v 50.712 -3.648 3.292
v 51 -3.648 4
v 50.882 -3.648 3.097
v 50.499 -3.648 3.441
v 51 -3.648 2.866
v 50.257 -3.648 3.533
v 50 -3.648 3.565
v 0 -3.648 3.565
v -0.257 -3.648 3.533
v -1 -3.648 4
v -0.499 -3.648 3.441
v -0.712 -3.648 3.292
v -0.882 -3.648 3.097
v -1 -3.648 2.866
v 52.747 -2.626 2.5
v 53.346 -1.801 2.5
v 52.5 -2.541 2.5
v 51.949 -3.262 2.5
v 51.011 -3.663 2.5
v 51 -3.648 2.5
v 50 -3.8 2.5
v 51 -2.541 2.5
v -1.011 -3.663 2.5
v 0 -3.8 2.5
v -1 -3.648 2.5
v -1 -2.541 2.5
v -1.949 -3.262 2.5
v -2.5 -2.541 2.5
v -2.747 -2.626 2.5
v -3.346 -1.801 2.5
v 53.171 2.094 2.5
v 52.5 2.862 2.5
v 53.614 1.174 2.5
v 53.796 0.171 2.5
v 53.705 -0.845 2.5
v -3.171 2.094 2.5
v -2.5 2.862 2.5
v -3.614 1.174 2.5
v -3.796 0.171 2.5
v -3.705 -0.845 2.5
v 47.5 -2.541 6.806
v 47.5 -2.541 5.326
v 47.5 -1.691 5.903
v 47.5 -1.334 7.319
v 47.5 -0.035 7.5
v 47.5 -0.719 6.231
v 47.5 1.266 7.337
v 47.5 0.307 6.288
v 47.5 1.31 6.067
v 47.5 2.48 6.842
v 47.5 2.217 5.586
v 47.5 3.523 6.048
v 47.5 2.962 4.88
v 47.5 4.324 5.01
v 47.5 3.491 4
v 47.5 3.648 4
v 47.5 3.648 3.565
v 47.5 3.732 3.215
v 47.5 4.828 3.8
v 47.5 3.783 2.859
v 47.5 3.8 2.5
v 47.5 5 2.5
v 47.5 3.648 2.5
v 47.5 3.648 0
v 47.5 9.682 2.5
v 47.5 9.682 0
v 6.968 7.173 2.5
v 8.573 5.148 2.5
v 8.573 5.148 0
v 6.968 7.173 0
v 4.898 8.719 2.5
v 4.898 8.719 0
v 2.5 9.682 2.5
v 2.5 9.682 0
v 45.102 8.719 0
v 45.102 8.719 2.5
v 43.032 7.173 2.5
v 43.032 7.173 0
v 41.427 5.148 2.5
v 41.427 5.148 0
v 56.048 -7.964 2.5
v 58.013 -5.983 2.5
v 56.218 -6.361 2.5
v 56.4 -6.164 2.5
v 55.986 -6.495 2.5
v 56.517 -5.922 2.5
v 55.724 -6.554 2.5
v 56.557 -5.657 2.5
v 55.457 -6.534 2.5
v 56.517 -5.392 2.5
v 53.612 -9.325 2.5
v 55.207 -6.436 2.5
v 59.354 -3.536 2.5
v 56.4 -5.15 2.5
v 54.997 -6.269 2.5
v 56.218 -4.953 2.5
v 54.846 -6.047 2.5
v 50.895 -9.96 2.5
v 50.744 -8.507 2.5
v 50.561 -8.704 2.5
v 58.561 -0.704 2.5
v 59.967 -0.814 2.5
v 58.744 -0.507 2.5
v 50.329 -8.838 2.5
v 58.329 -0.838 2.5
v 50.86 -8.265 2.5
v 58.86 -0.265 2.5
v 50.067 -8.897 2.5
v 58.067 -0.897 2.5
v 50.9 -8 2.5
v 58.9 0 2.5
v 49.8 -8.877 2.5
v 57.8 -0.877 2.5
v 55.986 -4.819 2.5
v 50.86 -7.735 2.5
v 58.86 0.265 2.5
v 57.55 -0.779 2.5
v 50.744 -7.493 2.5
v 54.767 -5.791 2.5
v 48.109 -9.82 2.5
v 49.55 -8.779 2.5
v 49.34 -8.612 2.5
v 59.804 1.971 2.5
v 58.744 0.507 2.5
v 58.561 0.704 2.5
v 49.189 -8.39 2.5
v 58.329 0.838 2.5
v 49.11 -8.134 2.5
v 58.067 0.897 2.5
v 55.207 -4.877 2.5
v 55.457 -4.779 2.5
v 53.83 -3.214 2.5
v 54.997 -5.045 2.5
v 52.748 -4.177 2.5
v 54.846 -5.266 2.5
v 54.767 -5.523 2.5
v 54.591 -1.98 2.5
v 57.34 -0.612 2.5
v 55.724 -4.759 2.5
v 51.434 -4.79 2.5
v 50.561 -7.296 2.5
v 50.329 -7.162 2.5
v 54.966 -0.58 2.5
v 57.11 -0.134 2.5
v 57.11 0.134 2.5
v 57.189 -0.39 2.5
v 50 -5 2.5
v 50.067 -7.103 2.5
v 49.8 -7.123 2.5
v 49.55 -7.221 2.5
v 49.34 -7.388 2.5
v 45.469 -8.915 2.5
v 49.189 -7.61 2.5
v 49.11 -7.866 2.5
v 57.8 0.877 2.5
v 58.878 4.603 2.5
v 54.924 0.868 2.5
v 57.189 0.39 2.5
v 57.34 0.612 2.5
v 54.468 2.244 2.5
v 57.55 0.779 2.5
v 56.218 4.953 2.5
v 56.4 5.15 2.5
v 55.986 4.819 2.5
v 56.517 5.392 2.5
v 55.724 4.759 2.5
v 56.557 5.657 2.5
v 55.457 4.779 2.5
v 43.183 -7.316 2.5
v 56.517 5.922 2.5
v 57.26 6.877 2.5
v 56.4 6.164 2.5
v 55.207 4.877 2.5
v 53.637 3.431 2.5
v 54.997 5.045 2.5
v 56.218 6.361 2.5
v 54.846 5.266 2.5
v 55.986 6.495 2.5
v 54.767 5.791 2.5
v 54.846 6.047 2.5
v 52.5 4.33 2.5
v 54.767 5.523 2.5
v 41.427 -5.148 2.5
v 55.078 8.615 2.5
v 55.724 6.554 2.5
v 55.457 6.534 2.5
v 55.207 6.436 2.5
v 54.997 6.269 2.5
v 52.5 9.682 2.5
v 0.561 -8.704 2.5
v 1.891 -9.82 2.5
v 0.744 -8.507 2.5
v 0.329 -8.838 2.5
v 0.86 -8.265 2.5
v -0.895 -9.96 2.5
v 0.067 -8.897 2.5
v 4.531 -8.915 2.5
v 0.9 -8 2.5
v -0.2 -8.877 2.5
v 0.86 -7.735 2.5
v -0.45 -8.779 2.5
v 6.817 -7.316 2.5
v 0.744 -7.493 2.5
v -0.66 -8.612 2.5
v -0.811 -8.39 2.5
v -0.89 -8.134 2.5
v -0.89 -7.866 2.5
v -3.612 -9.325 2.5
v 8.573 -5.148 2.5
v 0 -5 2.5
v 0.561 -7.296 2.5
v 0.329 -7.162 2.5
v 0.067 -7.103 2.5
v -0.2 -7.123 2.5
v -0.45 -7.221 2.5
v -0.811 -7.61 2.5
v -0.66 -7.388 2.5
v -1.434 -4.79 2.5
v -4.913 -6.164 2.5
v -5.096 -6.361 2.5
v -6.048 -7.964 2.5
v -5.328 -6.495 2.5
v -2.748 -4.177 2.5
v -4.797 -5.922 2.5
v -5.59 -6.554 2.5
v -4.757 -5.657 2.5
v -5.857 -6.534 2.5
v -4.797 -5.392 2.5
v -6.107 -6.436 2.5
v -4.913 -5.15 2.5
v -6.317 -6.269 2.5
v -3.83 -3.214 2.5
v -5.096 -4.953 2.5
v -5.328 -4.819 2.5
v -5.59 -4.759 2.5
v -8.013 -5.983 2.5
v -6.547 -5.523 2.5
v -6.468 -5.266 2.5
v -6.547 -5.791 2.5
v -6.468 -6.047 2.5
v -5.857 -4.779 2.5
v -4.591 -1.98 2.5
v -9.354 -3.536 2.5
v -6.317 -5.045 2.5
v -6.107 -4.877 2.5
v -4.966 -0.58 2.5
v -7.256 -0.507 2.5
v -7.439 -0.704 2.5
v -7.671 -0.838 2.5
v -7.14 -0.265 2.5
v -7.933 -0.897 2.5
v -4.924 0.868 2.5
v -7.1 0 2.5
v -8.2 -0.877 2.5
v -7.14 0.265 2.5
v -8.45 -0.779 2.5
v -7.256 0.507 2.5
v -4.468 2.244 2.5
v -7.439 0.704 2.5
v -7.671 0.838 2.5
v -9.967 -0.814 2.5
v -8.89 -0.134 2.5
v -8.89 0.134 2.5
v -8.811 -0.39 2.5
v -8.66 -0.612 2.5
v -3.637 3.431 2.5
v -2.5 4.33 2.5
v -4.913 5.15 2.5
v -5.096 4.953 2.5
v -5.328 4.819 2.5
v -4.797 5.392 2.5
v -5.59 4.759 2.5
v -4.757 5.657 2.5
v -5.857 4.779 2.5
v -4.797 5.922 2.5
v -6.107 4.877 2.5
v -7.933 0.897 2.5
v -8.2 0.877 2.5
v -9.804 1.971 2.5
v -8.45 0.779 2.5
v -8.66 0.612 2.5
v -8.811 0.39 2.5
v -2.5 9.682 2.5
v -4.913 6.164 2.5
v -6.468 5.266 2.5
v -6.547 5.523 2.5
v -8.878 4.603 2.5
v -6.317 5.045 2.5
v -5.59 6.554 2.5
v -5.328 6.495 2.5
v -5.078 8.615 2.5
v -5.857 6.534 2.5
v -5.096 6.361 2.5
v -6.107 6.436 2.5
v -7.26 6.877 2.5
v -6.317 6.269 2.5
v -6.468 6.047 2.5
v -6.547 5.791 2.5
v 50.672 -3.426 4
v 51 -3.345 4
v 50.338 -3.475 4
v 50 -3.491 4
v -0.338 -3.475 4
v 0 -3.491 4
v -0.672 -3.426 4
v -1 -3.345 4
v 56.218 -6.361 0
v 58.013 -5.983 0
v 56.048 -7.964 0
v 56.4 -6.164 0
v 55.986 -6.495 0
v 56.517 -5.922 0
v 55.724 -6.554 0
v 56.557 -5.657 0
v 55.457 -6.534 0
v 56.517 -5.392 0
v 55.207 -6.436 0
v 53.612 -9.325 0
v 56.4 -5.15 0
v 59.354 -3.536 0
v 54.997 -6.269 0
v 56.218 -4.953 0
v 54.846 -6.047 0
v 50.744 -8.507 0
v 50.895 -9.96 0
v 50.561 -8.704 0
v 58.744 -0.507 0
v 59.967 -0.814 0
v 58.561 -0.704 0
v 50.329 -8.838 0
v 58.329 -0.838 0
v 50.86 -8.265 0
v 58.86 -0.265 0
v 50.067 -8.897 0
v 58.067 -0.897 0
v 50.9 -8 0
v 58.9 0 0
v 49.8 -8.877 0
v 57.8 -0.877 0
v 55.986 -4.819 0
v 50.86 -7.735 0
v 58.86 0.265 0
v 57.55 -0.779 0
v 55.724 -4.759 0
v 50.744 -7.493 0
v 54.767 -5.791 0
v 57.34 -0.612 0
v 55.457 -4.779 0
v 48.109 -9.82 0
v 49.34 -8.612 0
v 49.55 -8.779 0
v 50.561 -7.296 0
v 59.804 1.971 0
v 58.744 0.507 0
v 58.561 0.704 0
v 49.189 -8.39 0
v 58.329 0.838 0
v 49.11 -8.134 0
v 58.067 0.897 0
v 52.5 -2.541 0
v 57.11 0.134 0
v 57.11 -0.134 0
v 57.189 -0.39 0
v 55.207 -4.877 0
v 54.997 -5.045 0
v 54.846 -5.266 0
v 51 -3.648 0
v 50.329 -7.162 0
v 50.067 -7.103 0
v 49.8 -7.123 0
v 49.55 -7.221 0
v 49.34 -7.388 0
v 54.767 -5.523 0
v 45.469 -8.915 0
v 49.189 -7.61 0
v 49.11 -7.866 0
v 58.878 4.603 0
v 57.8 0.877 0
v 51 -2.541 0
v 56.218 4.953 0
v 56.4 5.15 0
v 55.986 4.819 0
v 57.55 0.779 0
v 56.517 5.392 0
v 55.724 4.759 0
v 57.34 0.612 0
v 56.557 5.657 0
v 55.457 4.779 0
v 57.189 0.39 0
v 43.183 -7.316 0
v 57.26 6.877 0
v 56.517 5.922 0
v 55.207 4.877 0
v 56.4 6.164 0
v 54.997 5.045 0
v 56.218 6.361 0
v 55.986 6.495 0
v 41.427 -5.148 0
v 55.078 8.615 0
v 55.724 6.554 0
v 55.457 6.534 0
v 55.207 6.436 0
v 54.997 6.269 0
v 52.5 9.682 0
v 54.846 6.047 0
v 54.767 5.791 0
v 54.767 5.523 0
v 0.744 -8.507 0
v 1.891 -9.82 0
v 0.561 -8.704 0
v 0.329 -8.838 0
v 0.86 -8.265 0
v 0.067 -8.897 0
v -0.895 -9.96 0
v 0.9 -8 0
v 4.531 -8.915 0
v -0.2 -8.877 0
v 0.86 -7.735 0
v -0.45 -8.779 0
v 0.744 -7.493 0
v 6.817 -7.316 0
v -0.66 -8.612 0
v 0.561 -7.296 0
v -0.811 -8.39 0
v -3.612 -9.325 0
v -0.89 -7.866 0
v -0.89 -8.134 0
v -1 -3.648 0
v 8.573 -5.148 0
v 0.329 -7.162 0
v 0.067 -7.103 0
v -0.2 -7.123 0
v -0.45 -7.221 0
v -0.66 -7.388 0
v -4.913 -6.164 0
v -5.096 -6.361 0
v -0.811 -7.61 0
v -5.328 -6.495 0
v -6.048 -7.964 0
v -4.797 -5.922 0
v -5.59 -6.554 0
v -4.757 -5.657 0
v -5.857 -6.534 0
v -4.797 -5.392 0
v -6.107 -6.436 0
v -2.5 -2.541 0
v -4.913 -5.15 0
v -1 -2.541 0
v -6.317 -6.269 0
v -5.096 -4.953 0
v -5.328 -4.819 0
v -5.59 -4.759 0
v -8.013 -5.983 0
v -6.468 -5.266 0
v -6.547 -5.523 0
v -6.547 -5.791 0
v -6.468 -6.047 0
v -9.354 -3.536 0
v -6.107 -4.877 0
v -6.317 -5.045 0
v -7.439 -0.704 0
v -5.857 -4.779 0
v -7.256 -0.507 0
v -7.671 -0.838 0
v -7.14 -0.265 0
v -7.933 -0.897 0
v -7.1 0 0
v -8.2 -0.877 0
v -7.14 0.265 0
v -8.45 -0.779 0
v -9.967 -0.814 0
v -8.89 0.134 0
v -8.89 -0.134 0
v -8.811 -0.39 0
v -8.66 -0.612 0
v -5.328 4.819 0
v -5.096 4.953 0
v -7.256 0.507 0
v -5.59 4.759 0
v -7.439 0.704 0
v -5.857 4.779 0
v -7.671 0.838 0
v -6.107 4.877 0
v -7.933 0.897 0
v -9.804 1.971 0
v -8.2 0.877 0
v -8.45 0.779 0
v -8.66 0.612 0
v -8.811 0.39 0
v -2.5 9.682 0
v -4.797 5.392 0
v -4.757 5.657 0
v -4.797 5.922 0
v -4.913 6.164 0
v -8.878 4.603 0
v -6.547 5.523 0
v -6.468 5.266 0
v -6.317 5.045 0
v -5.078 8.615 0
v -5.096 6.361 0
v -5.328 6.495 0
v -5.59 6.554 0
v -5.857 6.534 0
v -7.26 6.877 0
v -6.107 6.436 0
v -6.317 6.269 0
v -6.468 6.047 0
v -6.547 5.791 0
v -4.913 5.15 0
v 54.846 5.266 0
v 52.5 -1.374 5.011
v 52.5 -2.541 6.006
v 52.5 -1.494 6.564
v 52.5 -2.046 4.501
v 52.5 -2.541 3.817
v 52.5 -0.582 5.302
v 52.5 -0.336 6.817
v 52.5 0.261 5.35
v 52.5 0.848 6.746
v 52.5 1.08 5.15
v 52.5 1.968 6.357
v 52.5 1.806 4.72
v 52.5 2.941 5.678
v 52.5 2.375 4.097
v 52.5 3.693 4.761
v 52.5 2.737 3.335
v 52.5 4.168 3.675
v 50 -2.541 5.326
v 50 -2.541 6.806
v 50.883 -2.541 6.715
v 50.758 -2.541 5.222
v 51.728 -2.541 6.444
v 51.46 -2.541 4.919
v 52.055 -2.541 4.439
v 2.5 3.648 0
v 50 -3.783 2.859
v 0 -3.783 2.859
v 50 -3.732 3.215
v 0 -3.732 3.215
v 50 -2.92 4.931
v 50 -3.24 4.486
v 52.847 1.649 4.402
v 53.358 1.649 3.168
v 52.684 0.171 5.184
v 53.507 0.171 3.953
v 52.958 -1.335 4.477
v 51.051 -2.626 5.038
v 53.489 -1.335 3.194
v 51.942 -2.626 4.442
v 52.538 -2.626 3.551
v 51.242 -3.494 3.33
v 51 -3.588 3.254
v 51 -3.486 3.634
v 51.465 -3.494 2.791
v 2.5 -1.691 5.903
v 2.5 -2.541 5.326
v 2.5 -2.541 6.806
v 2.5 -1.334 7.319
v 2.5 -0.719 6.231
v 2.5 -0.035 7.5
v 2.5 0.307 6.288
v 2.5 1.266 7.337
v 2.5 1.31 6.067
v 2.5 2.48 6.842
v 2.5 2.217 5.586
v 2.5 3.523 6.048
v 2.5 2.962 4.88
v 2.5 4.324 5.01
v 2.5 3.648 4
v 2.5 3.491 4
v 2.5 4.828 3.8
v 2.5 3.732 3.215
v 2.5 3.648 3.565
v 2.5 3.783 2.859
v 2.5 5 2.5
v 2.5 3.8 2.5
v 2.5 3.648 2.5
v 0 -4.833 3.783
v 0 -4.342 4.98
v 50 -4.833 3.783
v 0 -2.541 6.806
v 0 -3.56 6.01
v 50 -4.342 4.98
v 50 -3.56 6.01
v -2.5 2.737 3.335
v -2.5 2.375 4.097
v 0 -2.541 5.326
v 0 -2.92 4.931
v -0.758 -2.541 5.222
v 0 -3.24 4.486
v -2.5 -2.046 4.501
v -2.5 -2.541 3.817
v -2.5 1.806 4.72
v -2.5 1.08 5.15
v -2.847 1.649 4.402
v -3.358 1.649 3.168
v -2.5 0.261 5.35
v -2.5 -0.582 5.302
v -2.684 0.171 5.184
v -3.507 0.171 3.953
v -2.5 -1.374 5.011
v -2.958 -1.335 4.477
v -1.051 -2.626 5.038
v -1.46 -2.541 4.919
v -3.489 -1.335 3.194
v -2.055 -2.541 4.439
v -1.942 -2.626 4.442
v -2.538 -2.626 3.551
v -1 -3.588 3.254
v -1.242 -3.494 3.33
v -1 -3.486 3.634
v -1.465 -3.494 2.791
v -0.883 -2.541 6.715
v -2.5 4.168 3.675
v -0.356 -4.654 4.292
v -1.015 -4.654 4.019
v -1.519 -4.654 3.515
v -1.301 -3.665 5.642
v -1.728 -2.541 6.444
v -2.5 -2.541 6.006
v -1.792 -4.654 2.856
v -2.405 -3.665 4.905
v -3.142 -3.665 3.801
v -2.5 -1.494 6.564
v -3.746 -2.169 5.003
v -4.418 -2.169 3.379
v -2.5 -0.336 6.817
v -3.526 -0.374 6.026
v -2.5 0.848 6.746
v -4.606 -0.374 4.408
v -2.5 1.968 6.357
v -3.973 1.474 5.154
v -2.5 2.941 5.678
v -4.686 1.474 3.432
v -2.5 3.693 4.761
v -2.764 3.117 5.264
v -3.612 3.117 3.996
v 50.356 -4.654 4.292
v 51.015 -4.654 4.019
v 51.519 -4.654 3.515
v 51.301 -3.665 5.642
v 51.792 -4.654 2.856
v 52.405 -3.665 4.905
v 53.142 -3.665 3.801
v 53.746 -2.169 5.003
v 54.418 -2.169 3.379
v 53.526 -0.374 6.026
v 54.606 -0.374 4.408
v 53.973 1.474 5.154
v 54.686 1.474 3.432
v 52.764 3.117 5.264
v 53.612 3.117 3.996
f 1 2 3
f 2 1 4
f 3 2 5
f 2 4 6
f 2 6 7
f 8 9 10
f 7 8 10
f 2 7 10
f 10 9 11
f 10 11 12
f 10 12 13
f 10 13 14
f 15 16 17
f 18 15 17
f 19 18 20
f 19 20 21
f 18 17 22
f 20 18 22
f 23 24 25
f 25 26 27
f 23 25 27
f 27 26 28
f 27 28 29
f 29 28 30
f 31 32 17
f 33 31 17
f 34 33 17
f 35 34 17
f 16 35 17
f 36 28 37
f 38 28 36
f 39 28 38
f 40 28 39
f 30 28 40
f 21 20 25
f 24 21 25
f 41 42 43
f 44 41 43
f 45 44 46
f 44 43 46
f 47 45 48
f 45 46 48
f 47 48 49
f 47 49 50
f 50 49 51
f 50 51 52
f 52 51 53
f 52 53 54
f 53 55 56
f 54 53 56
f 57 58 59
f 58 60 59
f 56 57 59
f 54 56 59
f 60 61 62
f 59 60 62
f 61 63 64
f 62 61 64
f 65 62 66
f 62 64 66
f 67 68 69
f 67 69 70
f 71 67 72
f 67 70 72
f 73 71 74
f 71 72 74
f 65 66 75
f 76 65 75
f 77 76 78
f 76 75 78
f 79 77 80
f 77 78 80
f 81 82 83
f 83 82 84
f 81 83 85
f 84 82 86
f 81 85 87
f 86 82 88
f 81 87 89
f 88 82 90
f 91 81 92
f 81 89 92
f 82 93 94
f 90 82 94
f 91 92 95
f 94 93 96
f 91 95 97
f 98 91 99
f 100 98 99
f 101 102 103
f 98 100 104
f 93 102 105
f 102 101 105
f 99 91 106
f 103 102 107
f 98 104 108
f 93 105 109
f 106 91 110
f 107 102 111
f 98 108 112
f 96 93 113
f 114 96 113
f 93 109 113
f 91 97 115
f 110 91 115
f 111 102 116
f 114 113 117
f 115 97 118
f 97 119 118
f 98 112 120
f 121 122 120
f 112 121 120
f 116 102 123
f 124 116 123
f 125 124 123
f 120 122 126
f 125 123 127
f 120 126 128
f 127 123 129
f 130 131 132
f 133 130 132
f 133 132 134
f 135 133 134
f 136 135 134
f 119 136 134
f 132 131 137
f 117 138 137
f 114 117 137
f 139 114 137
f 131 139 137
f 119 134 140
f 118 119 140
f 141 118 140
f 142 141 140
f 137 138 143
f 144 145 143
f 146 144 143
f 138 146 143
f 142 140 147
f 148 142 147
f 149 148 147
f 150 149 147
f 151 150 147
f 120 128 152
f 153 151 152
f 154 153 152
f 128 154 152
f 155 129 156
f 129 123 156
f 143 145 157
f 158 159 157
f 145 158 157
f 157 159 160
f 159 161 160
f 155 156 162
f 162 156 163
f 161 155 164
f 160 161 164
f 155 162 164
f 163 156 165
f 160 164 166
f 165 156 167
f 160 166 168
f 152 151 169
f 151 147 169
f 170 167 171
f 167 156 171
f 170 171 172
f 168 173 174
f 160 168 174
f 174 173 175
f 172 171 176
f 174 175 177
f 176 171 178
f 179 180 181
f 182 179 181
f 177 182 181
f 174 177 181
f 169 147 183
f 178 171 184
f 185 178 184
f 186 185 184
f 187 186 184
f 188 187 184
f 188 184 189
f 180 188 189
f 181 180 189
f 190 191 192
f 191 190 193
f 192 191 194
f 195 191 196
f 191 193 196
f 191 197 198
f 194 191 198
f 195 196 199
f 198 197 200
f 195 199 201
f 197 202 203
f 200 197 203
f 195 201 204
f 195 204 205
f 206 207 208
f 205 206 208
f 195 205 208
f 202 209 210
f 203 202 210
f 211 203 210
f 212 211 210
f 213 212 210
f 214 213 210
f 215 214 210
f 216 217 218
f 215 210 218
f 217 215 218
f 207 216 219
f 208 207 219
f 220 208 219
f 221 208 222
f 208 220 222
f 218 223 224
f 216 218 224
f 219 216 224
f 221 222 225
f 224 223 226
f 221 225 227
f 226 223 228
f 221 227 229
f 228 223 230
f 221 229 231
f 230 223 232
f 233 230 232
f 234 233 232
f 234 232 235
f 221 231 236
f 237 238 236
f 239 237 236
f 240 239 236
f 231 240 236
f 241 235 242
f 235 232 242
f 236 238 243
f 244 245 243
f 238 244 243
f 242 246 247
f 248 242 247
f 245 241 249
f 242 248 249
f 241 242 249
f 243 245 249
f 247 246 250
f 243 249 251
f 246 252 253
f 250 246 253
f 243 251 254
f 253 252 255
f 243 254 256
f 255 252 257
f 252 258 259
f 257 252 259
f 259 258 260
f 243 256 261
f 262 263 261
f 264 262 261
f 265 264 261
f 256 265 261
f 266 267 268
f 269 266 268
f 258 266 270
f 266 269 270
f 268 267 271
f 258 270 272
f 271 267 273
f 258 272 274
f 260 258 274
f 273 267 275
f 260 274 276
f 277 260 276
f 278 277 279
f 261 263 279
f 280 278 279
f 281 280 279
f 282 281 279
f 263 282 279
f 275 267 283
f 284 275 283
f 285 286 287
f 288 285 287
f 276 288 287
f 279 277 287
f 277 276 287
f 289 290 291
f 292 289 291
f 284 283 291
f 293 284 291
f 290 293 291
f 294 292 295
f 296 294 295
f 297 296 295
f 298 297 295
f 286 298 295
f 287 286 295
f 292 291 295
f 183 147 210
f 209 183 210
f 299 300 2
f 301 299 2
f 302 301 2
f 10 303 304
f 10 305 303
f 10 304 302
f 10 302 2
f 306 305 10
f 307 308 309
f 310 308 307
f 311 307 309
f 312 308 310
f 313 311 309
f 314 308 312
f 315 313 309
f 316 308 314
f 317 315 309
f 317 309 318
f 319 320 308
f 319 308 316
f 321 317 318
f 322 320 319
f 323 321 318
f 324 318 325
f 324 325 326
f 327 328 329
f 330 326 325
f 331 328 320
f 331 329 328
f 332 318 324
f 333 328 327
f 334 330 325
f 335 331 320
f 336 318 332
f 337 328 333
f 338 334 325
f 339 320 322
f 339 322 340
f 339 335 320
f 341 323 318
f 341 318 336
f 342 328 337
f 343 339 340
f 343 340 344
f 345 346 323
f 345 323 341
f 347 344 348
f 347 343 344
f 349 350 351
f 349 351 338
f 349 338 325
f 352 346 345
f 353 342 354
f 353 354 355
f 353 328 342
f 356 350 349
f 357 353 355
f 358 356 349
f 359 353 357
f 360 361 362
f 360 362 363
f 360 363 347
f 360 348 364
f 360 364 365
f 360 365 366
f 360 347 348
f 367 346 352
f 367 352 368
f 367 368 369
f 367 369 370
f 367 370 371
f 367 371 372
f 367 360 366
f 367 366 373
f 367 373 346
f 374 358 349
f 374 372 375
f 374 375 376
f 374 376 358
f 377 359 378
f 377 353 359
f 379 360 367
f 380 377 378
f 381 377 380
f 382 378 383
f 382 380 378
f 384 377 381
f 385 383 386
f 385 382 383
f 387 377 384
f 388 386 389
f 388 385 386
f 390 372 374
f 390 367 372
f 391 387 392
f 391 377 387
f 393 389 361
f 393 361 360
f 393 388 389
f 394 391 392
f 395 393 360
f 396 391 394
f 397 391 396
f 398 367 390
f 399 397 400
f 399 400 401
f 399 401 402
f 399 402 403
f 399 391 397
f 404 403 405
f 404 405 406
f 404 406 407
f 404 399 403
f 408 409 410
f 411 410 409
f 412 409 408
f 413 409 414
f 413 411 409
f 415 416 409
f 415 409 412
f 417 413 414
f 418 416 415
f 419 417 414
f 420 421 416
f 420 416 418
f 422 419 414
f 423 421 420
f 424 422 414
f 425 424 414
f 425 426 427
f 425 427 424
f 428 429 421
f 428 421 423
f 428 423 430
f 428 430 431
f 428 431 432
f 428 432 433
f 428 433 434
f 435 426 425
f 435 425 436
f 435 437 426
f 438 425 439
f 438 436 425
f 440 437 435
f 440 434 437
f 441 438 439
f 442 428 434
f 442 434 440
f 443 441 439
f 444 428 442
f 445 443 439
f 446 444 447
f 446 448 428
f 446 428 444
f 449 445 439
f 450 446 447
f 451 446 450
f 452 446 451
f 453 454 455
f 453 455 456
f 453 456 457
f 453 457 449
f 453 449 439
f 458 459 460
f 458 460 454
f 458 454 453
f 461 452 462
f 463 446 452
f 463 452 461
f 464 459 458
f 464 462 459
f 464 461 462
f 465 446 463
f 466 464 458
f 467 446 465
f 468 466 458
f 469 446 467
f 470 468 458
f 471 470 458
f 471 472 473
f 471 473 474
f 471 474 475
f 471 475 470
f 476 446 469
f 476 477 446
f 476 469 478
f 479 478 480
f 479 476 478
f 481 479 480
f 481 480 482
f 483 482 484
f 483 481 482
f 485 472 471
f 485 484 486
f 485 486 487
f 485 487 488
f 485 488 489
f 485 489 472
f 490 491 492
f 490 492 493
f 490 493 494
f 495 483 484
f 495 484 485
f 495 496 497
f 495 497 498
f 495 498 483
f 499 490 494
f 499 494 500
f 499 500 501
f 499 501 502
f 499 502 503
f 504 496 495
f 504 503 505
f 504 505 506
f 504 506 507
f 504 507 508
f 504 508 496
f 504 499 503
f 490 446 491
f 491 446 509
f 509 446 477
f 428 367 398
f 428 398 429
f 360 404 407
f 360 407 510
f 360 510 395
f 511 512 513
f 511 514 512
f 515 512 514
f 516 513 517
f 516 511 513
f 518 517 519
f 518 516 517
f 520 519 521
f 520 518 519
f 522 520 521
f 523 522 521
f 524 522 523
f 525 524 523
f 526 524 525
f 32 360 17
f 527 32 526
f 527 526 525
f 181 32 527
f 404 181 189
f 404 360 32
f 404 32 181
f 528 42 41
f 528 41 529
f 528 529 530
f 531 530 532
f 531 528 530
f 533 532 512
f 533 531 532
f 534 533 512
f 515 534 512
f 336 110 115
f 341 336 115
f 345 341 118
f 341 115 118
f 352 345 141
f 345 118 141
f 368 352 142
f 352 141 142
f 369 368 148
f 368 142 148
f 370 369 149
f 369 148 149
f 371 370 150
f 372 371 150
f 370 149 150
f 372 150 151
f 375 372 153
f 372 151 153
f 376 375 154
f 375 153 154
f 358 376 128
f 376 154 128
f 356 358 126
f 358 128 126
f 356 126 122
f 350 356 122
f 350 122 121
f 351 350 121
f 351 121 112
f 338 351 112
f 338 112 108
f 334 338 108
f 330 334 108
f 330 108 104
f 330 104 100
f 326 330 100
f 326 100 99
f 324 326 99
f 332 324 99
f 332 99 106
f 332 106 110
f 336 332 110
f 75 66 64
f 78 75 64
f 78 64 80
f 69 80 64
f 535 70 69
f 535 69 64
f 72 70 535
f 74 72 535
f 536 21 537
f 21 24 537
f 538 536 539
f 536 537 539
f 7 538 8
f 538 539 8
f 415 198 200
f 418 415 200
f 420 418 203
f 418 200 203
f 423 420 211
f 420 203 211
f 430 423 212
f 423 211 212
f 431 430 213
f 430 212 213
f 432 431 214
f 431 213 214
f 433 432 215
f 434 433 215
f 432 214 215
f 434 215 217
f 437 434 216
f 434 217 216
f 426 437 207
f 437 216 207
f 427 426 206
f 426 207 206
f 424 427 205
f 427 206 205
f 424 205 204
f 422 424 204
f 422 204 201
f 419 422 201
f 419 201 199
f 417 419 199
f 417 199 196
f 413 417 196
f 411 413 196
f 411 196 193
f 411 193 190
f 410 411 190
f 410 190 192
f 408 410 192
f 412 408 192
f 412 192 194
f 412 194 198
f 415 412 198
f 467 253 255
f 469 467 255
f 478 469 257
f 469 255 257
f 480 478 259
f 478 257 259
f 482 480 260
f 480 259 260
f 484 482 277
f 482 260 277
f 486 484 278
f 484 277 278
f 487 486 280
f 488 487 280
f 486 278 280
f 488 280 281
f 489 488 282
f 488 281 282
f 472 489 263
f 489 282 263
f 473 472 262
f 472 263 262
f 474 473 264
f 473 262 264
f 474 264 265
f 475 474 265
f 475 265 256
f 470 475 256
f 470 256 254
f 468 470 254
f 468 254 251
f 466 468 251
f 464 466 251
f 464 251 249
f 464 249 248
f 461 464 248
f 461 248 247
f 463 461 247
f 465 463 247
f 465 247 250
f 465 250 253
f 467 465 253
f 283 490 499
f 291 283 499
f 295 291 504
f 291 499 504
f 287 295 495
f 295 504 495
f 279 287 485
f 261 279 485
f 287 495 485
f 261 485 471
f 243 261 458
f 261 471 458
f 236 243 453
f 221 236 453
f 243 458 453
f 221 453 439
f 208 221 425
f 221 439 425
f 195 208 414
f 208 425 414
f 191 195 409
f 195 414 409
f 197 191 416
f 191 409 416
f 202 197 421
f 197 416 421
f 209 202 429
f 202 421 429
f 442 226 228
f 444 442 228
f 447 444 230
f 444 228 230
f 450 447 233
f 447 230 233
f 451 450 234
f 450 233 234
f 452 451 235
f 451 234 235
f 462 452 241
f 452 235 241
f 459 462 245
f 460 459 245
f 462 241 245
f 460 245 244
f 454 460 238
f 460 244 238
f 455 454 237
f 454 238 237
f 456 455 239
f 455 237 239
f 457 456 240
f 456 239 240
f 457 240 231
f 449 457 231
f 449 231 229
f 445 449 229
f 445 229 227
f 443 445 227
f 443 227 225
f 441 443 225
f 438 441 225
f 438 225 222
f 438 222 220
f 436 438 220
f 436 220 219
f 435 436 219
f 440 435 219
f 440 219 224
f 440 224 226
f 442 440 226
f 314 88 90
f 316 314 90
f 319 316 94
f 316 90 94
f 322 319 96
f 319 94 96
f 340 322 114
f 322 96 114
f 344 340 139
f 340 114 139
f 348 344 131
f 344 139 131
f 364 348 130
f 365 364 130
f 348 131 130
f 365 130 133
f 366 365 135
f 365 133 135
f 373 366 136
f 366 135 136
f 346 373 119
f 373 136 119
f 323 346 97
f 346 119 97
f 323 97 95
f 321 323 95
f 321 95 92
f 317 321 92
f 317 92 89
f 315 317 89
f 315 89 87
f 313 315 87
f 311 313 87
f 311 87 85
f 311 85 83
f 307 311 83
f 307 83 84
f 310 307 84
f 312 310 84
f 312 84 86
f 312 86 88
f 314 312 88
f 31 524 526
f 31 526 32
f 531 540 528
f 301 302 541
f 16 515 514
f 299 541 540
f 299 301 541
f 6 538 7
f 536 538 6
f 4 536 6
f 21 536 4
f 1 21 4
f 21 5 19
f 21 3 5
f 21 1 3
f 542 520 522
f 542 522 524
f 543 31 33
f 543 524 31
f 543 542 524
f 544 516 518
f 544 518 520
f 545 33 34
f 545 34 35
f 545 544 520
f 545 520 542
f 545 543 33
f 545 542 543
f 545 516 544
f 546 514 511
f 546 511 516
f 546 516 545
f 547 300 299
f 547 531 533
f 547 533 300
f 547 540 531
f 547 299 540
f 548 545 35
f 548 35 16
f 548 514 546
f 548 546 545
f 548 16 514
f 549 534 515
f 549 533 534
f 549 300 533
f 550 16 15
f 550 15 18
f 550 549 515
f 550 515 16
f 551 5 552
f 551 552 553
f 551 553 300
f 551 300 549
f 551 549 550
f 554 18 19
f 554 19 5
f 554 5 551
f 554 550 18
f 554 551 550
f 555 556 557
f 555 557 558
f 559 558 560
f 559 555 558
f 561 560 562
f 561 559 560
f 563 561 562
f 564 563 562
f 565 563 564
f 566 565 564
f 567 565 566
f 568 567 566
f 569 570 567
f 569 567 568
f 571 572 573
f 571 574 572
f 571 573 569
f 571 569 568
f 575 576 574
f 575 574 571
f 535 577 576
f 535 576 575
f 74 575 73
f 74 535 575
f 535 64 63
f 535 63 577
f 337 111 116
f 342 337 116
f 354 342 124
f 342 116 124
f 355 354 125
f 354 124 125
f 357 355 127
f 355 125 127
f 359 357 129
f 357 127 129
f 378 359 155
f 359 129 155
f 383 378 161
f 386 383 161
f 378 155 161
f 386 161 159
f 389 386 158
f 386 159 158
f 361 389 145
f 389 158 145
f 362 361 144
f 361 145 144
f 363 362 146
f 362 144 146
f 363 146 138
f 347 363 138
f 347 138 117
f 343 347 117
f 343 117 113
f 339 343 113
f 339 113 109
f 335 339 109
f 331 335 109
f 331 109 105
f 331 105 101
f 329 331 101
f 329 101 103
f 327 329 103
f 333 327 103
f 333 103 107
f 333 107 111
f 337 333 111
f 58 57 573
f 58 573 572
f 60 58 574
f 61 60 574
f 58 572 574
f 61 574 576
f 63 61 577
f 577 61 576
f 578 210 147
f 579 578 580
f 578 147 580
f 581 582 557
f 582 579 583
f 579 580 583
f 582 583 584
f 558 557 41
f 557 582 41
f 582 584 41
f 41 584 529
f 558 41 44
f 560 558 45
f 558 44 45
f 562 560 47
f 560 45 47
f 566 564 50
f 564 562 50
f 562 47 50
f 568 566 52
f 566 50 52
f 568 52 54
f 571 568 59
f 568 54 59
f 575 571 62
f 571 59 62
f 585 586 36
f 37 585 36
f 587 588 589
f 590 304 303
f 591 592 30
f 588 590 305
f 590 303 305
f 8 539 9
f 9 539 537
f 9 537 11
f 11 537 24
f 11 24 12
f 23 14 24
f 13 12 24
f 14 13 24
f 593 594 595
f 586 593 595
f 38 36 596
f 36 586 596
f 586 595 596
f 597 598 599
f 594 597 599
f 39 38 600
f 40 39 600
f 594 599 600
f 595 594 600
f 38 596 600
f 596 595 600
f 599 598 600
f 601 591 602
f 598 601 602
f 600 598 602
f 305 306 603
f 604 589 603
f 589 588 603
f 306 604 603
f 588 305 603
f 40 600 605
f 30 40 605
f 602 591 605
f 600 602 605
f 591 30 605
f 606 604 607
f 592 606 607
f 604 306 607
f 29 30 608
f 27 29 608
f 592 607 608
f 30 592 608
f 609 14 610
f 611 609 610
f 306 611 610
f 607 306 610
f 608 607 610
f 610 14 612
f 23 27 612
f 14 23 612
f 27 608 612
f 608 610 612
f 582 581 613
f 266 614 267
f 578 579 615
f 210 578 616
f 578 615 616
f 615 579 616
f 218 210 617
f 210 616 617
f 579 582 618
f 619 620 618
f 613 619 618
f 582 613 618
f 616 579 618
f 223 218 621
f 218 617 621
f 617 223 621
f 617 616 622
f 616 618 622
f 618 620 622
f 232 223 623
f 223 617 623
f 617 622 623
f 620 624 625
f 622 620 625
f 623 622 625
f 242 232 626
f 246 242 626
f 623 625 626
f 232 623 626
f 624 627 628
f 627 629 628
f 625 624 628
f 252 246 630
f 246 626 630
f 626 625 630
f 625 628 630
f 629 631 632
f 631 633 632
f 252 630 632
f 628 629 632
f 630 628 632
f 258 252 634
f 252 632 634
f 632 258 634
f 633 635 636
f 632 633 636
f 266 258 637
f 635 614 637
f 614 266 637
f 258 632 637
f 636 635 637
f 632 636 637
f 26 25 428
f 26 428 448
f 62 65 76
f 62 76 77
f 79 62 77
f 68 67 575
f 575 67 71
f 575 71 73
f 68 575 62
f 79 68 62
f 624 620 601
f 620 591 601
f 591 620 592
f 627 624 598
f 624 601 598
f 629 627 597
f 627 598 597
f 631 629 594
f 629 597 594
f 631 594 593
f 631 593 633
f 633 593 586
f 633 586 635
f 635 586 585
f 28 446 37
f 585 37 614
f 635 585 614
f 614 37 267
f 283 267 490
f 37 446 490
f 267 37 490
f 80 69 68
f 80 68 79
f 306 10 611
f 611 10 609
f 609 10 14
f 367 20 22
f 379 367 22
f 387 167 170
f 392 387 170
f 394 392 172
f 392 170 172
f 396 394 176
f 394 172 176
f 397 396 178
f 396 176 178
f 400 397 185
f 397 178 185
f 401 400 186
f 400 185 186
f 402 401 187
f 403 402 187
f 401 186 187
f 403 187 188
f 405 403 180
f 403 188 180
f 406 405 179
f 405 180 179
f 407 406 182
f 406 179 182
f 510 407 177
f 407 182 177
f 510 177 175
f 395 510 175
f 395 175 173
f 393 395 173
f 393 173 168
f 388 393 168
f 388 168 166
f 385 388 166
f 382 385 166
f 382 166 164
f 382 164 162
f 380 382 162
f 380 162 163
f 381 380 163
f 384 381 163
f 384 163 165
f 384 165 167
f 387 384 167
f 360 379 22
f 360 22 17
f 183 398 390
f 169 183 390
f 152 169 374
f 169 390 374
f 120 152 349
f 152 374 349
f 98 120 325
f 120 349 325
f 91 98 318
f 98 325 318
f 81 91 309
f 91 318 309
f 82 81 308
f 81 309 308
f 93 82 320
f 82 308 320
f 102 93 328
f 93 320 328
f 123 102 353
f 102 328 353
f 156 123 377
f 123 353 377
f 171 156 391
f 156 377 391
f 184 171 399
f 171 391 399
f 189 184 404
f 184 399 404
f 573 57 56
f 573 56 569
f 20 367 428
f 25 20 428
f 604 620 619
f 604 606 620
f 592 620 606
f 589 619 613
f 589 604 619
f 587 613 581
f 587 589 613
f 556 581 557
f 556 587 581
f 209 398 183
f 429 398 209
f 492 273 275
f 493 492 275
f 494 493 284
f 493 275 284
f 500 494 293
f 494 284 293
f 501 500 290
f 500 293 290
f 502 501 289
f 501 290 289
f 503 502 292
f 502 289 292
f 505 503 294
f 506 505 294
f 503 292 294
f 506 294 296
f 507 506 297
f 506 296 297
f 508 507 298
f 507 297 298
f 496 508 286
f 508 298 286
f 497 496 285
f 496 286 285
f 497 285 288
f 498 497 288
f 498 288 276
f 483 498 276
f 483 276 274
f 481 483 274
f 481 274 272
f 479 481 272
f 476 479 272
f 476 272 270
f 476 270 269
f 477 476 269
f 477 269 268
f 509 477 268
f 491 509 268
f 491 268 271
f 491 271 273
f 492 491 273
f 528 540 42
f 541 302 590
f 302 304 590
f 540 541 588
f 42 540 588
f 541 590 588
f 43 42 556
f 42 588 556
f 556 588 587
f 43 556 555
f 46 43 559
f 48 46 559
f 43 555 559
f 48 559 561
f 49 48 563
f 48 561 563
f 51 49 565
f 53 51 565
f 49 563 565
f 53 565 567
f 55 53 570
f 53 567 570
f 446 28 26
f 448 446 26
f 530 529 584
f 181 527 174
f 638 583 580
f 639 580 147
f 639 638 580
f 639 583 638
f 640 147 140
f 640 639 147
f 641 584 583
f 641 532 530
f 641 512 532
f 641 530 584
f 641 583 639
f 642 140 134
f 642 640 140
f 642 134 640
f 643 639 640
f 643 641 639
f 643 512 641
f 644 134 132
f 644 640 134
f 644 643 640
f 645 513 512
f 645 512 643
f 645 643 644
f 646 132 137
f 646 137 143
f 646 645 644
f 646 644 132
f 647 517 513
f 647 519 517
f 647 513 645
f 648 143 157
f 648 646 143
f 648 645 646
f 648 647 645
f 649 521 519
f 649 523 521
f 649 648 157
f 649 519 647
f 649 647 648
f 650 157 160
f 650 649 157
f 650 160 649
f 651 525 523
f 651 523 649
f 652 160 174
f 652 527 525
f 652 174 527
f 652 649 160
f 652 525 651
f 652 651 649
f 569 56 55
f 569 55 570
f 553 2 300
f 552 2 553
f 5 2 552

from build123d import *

# Parameters (mm, degrees)
ESQUISSE1_R                  = 2.45
BOSS_EXTRU_1_DEPTH           = 2.5
BOSS_EXTRU_4_START           = -2.5
ESQUISSE4_R                  = 10
ESQUISSE4_R_2                = 2.45
BOSS_EXTRU_4_DEPTH           = 2.5
ESQUISSE5_R                  = 0.9
ENL_V_MAT_EXTRU_3_DEPTH      = 10
R_VOLUTION1_ANGLE            = 90
R_VOLUTION1_OTHER_WAY_ANGLE  = 90
R_VOLUTION2_ANGLE            = 90
R_VOLUTION3_ANGLE            = 90
ESQUISSE9_W                  = 52
ESQUISSE9_H                  = 7.295463698
ENL_V_MAT_EXTRU_4_DEPTH      = 4
ENL_V_MAT_EXTRU_5_DEPTH      = 62.032778079
ENL_V_MAT_EXTRU_5_DEPTH_BACK = 62.032778079
ESQUISSE10_W                 = 5
ESQUISSE10_H                 = 14.990995253


with BuildPart() as part:
    # Esquisse1 → Boss.-Extru.1 (new body)
    with BuildSketch(Plane.XY):
        with BuildLine():
            Line((0, 5.147731849), (50, 5.147731849))
            ThreePointArc((50, 5.147731849), (55.147731849, 0), (50, -5.147731849))
            Line((50, -5.147731849), (0, -5.147731849))
            ThreePointArc((0, -5.147731849), (-5.147731849, 0), (0, 5.147731849))
        make_face()
        Circle(ESQUISSE1_R, mode=Mode.SUBTRACT)
        with Locations((50, 0)):
            Circle(ESQUISSE1_R, mode=Mode.SUBTRACT)
    extrude(amount=BOSS_EXTRU_1_DEPTH)

    # Esquisse4 → Boss.-Extru.4 (add)
    # profile 1 of 2: a face of its own
    with BuildSketch(Plane.XY.offset(2.5).offset(BOSS_EXTRU_4_START)):
        Circle(ESQUISSE4_R)
        Circle(ESQUISSE4_R_2, mode=Mode.SUBTRACT)
    # profile 2 of 2: a face of its own
    with BuildSketch(Plane.XY.offset(2.5).offset(BOSS_EXTRU_4_START)):
        with Locations((50, 0)):
            Circle(ESQUISSE4_R)
        with Locations((50, 0)):
            Circle(ESQUISSE4_R_2, mode=Mode.SUBTRACT)
    extrude(amount=BOSS_EXTRU_4_DEPTH)

    # Esquisse5 → Enlèv. mat.-Extru.3 (cut)
    with BuildSketch(Plane.XY.offset(2.5)):
        with Locations((-8, 0)):
            Circle(ESQUISSE5_R)
        with Locations((-5.656854249, 5.656854249)):
            Circle(ESQUISSE5_R)
        with Locations((0, 8)):
            Circle(ESQUISSE5_R)
        with Locations((0, -8)):
            Circle(ESQUISSE5_R)
        with Locations((-5.656854249, -5.656854249)):
            Circle(ESQUISSE5_R)
        with Locations((50, -8)):
            Circle(ESQUISSE5_R)
        with Locations((55.656854249, -5.656854249)):
            Circle(ESQUISSE5_R)
        with Locations((58, 0)):
            Circle(ESQUISSE5_R)
        with Locations((55.656854249, 5.656854249)):
            Circle(ESQUISSE5_R)
        with Locations((50, 8)):
            Circle(ESQUISSE5_R)
    extrude(amount=-ENL_V_MAT_EXTRU_3_DEPTH, mode=Mode.SUBTRACT)

    # Esquisse6 → Révolution1 (revolve)
    with BuildSketch(Plane(origin=(0, 0, 0), x_dir=(1, 0, 0), z_dir=(0, 1, 0))):
        Polygon((8.57326407, -6.3), (41.42673593, -6.3), (50, -6.3), (50, -7.5), (41.42673593, -7.5), (8.57326407, -7.5), (0, -7.5), (0, -6.3), align=None)
    revolve(axis=Axis((8.57326407, 0, 2.5), (1, 0, 0)), revolution_arc=R_VOLUTION1_ANGLE)

    # Esquisse6 → Révolution1 other way (revolve)
    with BuildSketch(Plane(origin=(0, 0, 0), x_dir=(1, 0, 0), z_dir=(0, 1, 0))):
        Polygon((8.57326407, -6.3), (41.42673593, -6.3), (50, -6.3), (50, -7.5), (41.42673593, -7.5), (8.57326407, -7.5), (0, -7.5), (0, -6.3), align=None)
    revolve(axis=Axis((8.57326407, 0, 2.5), (-1, 0, 0)), revolution_arc=R_VOLUTION1_OTHER_WAY_ANGLE)

    # Esquisse7 → Révolution2 (revolve)
    with BuildSketch(Plane.ZY):
        with BuildLine():
            Line((2.5, 5), (2.5, 3.8))
            ThreePointArc((2.5, 3.8), (6.3, 0), (2.5, -3.8))
            Line((2.5, -3.8), (2.5, -5))
            ThreePointArc((2.5, -5), (7.5, 0), (2.5, 5))
        make_face()
    revolve(axis=Axis((0, 5, 2.5), (0, -1, 0)), revolution_arc=R_VOLUTION2_ANGLE)

    # Esquisse8 → Révolution3 (revolve)
    with BuildSketch(Plane(origin=(50, 0, 0), x_dir=(0, 0, -1), z_dir=(1, 0, 0))):
        with BuildLine():
            Line((-2.5, 5), (-2.5, 3.8))
            ThreePointArc((-2.5, 3.8), (-6.3, 0), (-2.5, -3.8))
            Line((-2.5, -3.8), (-2.5, -5))
            ThreePointArc((-2.5, -5), (-7.5, 0), (-2.5, 5))
        make_face()
    revolve(axis=Axis((50, 5, 2.5), (0, 1, 0)), revolution_arc=R_VOLUTION3_ANGLE)

    # Esquisse9 → Enlèv. mat.-Extru.4 (cut)
    with BuildSketch(Plane(origin=(0, 0, 0), x_dir=(-1, 0, 0), z_dir=(0, 0, -1))):
        with Locations((-25, 0)):
            Rectangle(ESQUISSE9_W, ESQUISSE9_H)
    extrude(amount=-ENL_V_MAT_EXTRU_4_DEPTH, mode=Mode.SUBTRACT)

    # Esquisse10 → Enlèv. mat.-Extru.5 (cut, two sides: drawn at the far end of the back side and taken through both)
    with BuildSketch(Plane.XY.offset(2.5).offset(-ENL_V_MAT_EXTRU_5_DEPTH_BACK)):
        with Locations((0, 4.954797126)):
            Rectangle(ESQUISSE10_W, ESQUISSE10_H)
        with Locations((50, 4.954797126)):
            Rectangle(ESQUISSE10_W, ESQUISSE10_H)
    extrude(amount=ENL_V_MAT_EXTRU_5_DEPTH + ENL_V_MAT_EXTRU_5_DEPTH_BACK, mode=Mode.SUBTRACT)


solid = part.part
